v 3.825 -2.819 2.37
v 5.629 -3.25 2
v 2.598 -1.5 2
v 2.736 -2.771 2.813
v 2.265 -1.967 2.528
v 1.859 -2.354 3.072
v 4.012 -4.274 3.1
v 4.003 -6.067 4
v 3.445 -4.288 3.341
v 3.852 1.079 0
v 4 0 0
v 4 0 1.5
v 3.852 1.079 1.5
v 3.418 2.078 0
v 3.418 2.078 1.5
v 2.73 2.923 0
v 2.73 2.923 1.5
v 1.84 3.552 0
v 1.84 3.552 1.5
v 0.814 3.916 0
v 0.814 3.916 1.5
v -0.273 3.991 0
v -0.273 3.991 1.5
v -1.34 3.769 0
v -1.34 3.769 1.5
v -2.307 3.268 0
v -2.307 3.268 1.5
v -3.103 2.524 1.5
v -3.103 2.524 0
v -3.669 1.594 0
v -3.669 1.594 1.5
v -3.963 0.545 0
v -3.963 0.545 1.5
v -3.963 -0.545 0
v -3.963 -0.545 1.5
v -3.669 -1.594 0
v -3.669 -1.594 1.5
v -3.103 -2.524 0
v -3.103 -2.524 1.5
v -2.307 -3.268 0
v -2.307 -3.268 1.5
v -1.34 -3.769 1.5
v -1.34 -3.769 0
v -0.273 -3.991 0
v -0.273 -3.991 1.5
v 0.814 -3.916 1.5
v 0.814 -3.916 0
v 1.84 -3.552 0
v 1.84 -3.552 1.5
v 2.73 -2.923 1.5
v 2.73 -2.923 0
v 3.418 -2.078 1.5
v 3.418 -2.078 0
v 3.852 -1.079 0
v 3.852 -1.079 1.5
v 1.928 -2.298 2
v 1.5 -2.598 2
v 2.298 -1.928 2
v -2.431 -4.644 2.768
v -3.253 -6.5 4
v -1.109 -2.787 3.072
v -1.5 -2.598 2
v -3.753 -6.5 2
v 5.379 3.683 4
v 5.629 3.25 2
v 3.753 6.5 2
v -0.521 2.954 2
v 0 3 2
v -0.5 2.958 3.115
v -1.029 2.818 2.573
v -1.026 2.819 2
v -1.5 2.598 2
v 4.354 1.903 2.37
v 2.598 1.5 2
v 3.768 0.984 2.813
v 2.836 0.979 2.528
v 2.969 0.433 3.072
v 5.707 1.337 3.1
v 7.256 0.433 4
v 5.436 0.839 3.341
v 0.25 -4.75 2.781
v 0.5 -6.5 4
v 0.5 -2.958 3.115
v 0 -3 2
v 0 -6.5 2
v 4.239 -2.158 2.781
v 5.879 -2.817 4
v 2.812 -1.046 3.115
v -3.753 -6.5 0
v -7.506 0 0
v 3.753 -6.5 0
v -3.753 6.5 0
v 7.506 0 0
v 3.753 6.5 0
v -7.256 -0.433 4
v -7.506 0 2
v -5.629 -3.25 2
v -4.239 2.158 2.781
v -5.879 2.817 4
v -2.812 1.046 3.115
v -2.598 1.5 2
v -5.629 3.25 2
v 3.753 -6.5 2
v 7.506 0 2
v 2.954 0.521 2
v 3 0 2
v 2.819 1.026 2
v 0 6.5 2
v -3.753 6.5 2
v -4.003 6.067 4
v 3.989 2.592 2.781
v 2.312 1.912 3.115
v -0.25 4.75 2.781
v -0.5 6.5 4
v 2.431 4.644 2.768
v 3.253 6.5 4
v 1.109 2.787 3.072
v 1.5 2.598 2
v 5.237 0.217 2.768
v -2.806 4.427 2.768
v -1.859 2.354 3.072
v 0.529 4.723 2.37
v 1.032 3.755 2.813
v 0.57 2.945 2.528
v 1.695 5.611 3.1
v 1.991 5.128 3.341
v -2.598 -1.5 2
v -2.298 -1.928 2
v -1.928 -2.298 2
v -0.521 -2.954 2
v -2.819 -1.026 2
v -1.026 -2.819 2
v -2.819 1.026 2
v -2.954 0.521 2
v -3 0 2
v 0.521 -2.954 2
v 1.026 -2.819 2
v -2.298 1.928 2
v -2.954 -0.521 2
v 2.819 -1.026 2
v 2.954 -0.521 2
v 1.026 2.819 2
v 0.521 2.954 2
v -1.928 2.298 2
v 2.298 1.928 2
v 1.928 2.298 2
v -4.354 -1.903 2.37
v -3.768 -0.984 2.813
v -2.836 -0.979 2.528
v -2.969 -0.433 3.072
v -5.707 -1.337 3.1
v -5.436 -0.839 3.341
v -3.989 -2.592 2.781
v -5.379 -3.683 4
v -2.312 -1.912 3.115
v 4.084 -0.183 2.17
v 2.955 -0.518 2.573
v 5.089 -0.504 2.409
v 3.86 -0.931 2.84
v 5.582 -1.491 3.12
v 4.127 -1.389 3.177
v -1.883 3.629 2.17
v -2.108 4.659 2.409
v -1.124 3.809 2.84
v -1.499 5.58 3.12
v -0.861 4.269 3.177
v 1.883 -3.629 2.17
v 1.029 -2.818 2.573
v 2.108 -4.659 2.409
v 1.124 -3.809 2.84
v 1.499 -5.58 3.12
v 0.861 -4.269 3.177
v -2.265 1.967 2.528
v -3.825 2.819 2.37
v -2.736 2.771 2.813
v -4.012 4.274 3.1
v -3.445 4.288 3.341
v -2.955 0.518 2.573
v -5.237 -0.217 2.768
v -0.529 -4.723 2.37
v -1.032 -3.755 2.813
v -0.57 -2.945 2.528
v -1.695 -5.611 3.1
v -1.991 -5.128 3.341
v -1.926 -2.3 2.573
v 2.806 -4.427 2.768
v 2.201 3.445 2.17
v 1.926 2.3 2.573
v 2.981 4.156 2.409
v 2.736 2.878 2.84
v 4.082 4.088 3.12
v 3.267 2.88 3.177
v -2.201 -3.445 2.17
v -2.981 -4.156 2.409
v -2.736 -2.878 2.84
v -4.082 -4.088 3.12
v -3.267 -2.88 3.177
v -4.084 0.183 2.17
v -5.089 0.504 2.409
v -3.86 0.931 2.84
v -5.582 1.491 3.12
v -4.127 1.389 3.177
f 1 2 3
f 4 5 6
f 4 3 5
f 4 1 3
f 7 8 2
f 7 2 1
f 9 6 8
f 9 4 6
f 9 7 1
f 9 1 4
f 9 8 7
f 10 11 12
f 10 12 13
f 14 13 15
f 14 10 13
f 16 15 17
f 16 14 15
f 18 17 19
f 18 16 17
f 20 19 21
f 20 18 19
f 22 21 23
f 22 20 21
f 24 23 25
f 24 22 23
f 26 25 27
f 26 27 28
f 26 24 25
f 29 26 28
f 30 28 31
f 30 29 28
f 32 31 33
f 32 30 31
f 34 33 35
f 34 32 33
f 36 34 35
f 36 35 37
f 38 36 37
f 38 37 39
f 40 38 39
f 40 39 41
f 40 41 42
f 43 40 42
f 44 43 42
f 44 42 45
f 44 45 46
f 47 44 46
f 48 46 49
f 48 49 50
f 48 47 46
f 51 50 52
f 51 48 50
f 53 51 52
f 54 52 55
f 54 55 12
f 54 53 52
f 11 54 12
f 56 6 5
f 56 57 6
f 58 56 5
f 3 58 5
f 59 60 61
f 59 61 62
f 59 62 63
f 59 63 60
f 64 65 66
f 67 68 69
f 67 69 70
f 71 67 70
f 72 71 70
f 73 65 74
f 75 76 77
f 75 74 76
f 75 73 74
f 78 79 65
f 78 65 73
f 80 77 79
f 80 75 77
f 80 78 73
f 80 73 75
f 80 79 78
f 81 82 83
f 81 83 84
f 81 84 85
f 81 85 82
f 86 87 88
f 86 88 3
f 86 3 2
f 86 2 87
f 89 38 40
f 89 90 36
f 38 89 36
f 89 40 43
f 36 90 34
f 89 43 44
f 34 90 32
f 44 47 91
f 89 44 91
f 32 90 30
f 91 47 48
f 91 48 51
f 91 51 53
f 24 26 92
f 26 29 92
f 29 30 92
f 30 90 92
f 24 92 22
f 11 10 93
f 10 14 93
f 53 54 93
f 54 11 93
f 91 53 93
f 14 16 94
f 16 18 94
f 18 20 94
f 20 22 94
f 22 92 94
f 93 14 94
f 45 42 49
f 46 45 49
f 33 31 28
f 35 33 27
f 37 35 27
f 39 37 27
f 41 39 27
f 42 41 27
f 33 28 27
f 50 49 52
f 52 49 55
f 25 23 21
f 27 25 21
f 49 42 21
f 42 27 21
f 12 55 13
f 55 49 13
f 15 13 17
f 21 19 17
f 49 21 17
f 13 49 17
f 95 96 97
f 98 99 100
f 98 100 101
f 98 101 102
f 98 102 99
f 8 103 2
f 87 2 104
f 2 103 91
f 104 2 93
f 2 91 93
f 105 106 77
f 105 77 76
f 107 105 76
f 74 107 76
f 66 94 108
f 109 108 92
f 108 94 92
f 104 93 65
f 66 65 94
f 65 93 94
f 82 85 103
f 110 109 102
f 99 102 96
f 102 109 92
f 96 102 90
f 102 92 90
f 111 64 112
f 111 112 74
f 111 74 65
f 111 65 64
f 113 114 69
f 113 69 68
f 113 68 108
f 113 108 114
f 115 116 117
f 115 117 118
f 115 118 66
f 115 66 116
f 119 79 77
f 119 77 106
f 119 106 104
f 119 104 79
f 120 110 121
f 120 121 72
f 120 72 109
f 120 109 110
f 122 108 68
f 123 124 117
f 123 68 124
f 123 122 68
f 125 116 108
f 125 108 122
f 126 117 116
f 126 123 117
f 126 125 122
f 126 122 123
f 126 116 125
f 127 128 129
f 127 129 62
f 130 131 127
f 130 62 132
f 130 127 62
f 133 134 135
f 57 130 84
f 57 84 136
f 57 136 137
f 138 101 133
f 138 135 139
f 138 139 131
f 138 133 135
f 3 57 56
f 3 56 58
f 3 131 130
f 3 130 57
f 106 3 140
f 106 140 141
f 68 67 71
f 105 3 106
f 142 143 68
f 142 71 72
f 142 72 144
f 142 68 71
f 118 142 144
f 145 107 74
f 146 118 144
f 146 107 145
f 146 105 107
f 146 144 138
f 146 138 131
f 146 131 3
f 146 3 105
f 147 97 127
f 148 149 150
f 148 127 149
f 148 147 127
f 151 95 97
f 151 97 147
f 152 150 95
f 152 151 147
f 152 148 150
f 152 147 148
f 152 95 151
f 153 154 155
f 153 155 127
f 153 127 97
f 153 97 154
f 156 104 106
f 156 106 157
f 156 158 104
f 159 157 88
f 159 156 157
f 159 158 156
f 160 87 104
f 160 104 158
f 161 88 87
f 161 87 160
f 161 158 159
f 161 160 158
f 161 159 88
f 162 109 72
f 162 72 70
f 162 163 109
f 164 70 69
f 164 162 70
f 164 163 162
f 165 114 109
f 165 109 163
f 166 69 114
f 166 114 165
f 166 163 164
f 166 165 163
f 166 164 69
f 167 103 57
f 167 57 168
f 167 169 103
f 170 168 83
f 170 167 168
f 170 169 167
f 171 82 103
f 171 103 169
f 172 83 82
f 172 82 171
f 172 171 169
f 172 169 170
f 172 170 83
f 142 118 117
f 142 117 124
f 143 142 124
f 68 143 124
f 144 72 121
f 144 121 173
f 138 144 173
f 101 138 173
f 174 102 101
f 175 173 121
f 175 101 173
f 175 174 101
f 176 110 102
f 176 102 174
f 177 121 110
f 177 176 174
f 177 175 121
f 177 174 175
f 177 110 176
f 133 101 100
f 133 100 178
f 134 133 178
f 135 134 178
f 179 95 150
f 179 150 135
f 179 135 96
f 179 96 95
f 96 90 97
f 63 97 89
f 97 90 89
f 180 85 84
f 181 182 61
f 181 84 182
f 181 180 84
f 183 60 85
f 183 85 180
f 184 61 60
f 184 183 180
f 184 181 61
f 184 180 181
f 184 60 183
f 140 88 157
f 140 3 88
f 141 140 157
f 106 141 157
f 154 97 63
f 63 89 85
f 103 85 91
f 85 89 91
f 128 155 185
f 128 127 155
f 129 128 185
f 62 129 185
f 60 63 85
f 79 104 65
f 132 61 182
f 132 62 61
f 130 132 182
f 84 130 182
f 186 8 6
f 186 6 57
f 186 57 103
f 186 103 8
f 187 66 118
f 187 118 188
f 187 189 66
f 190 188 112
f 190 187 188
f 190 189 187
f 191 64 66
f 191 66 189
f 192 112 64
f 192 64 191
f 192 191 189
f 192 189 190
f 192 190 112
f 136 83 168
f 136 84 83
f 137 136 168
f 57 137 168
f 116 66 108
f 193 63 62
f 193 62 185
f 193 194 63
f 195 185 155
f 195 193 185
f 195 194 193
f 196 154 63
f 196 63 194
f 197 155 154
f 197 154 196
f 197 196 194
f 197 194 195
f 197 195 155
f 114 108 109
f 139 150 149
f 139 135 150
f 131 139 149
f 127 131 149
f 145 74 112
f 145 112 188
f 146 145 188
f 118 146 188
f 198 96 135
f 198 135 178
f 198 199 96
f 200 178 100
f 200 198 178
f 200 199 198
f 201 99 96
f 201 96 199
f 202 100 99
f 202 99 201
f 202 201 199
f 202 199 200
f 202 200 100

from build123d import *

# Parameters (mm, degrees)
F1_DEPTH        = 2
F6_COPIES_COUNT = 6
F7_COPIES_COUNT = 6
F8_R            = 4
F9_DEPTH        = 1.5
F10_R           = 3
F11_DEPTH       = 2.0010001


# Not quite as in the source:
# - a pattern or mirror of a feature is missing from the dataset's text; its kind, count and spacing are read off the source's solid


with BuildPart() as f1:
    # F0 (on Top) → F1 (new body)
    with BuildSketch(Plane.XY):
        Polygon((3.7527767497, 6.5), (-3.7527767497, 6.5), (-7.5055534995, 0), (-3.7527767497, -6.5), (3.7527767497, -6.5), (7.5055534995, 0), align=None)
    extrude(amount=F1_DEPTH)

    # F5 (on offset) → F6 section 0
    with BuildSketch(Plane(origin=(-2.1650635095, -1.25, 0), x_dir=(0.5, -0.8660254038, 0), z_dir=(-0.8660254038, -0.5, 0))):
        Polygon((-0.943375673, 3), (-1.443375673, 2), (0, 2), align=None)
    # F3 (on face) → F6 section 1
    with BuildSketch(Plane(origin=(-5.6291651246, -3.25, 0), x_dir=(0.5, -0.8660254038, 0), z_dir=(-0.8660254038, -0.5, 0))):
        Polygon((-3.2527767497, 4), (-3.7527767497, 2), (0, 2), align=None)
    f6 = loft()

    # F6_copies: F6 ×6 about axis
    f6_copies_axis = Axis((0, 0, 0), (0, 0, 1))
    for i in range(1, F6_COPIES_COUNT):
        add(f6.rotate(f6_copies_axis, i * 360 / F6_COPIES_COUNT))

    # F5 (on offset) → F7 section 0
    with BuildSketch(Plane(origin=(-2.1650635095, -1.25, 0), x_dir=(0.5, -0.8660254038, 0), z_dir=(-0.8660254038, -0.5, 0))):
        Polygon((0.5, 3), (0, 2), (1.443375673, 2), align=None)
    # F3 (on face) → F7 section 1
    with BuildSketch(Plane(origin=(-5.6291651246, -3.25, 0), x_dir=(0.5, -0.8660254038, 0), z_dir=(-0.8660254038, -0.5, 0))):
        Polygon((0.5, 4), (0, 2), (3.7527767497, 2), align=None)
    f7 = loft()

    # F7_copies: F7 ×6 about axis
    f7_copies_axis = Axis((0, 0, 0), (0, 0, 1))
    for i in range(1, F7_COPIES_COUNT):
        add(f7.rotate(f7_copies_axis, i * 360 / F7_COPIES_COUNT))

    # F8 (on Top) → F9 (cut)
    with BuildSketch(Plane.XY):
        Circle(F8_R)
    extrude(amount=F9_DEPTH, mode=Mode.SUBTRACT)

    # F10 (on face) → F11 (cut, through all)
    with BuildSketch(Plane.XY.offset(2)):
        Circle(F10_R)
    extrude(amount=F11_DEPTH, mode=Mode.SUBTRACT)


solid = f1.part
